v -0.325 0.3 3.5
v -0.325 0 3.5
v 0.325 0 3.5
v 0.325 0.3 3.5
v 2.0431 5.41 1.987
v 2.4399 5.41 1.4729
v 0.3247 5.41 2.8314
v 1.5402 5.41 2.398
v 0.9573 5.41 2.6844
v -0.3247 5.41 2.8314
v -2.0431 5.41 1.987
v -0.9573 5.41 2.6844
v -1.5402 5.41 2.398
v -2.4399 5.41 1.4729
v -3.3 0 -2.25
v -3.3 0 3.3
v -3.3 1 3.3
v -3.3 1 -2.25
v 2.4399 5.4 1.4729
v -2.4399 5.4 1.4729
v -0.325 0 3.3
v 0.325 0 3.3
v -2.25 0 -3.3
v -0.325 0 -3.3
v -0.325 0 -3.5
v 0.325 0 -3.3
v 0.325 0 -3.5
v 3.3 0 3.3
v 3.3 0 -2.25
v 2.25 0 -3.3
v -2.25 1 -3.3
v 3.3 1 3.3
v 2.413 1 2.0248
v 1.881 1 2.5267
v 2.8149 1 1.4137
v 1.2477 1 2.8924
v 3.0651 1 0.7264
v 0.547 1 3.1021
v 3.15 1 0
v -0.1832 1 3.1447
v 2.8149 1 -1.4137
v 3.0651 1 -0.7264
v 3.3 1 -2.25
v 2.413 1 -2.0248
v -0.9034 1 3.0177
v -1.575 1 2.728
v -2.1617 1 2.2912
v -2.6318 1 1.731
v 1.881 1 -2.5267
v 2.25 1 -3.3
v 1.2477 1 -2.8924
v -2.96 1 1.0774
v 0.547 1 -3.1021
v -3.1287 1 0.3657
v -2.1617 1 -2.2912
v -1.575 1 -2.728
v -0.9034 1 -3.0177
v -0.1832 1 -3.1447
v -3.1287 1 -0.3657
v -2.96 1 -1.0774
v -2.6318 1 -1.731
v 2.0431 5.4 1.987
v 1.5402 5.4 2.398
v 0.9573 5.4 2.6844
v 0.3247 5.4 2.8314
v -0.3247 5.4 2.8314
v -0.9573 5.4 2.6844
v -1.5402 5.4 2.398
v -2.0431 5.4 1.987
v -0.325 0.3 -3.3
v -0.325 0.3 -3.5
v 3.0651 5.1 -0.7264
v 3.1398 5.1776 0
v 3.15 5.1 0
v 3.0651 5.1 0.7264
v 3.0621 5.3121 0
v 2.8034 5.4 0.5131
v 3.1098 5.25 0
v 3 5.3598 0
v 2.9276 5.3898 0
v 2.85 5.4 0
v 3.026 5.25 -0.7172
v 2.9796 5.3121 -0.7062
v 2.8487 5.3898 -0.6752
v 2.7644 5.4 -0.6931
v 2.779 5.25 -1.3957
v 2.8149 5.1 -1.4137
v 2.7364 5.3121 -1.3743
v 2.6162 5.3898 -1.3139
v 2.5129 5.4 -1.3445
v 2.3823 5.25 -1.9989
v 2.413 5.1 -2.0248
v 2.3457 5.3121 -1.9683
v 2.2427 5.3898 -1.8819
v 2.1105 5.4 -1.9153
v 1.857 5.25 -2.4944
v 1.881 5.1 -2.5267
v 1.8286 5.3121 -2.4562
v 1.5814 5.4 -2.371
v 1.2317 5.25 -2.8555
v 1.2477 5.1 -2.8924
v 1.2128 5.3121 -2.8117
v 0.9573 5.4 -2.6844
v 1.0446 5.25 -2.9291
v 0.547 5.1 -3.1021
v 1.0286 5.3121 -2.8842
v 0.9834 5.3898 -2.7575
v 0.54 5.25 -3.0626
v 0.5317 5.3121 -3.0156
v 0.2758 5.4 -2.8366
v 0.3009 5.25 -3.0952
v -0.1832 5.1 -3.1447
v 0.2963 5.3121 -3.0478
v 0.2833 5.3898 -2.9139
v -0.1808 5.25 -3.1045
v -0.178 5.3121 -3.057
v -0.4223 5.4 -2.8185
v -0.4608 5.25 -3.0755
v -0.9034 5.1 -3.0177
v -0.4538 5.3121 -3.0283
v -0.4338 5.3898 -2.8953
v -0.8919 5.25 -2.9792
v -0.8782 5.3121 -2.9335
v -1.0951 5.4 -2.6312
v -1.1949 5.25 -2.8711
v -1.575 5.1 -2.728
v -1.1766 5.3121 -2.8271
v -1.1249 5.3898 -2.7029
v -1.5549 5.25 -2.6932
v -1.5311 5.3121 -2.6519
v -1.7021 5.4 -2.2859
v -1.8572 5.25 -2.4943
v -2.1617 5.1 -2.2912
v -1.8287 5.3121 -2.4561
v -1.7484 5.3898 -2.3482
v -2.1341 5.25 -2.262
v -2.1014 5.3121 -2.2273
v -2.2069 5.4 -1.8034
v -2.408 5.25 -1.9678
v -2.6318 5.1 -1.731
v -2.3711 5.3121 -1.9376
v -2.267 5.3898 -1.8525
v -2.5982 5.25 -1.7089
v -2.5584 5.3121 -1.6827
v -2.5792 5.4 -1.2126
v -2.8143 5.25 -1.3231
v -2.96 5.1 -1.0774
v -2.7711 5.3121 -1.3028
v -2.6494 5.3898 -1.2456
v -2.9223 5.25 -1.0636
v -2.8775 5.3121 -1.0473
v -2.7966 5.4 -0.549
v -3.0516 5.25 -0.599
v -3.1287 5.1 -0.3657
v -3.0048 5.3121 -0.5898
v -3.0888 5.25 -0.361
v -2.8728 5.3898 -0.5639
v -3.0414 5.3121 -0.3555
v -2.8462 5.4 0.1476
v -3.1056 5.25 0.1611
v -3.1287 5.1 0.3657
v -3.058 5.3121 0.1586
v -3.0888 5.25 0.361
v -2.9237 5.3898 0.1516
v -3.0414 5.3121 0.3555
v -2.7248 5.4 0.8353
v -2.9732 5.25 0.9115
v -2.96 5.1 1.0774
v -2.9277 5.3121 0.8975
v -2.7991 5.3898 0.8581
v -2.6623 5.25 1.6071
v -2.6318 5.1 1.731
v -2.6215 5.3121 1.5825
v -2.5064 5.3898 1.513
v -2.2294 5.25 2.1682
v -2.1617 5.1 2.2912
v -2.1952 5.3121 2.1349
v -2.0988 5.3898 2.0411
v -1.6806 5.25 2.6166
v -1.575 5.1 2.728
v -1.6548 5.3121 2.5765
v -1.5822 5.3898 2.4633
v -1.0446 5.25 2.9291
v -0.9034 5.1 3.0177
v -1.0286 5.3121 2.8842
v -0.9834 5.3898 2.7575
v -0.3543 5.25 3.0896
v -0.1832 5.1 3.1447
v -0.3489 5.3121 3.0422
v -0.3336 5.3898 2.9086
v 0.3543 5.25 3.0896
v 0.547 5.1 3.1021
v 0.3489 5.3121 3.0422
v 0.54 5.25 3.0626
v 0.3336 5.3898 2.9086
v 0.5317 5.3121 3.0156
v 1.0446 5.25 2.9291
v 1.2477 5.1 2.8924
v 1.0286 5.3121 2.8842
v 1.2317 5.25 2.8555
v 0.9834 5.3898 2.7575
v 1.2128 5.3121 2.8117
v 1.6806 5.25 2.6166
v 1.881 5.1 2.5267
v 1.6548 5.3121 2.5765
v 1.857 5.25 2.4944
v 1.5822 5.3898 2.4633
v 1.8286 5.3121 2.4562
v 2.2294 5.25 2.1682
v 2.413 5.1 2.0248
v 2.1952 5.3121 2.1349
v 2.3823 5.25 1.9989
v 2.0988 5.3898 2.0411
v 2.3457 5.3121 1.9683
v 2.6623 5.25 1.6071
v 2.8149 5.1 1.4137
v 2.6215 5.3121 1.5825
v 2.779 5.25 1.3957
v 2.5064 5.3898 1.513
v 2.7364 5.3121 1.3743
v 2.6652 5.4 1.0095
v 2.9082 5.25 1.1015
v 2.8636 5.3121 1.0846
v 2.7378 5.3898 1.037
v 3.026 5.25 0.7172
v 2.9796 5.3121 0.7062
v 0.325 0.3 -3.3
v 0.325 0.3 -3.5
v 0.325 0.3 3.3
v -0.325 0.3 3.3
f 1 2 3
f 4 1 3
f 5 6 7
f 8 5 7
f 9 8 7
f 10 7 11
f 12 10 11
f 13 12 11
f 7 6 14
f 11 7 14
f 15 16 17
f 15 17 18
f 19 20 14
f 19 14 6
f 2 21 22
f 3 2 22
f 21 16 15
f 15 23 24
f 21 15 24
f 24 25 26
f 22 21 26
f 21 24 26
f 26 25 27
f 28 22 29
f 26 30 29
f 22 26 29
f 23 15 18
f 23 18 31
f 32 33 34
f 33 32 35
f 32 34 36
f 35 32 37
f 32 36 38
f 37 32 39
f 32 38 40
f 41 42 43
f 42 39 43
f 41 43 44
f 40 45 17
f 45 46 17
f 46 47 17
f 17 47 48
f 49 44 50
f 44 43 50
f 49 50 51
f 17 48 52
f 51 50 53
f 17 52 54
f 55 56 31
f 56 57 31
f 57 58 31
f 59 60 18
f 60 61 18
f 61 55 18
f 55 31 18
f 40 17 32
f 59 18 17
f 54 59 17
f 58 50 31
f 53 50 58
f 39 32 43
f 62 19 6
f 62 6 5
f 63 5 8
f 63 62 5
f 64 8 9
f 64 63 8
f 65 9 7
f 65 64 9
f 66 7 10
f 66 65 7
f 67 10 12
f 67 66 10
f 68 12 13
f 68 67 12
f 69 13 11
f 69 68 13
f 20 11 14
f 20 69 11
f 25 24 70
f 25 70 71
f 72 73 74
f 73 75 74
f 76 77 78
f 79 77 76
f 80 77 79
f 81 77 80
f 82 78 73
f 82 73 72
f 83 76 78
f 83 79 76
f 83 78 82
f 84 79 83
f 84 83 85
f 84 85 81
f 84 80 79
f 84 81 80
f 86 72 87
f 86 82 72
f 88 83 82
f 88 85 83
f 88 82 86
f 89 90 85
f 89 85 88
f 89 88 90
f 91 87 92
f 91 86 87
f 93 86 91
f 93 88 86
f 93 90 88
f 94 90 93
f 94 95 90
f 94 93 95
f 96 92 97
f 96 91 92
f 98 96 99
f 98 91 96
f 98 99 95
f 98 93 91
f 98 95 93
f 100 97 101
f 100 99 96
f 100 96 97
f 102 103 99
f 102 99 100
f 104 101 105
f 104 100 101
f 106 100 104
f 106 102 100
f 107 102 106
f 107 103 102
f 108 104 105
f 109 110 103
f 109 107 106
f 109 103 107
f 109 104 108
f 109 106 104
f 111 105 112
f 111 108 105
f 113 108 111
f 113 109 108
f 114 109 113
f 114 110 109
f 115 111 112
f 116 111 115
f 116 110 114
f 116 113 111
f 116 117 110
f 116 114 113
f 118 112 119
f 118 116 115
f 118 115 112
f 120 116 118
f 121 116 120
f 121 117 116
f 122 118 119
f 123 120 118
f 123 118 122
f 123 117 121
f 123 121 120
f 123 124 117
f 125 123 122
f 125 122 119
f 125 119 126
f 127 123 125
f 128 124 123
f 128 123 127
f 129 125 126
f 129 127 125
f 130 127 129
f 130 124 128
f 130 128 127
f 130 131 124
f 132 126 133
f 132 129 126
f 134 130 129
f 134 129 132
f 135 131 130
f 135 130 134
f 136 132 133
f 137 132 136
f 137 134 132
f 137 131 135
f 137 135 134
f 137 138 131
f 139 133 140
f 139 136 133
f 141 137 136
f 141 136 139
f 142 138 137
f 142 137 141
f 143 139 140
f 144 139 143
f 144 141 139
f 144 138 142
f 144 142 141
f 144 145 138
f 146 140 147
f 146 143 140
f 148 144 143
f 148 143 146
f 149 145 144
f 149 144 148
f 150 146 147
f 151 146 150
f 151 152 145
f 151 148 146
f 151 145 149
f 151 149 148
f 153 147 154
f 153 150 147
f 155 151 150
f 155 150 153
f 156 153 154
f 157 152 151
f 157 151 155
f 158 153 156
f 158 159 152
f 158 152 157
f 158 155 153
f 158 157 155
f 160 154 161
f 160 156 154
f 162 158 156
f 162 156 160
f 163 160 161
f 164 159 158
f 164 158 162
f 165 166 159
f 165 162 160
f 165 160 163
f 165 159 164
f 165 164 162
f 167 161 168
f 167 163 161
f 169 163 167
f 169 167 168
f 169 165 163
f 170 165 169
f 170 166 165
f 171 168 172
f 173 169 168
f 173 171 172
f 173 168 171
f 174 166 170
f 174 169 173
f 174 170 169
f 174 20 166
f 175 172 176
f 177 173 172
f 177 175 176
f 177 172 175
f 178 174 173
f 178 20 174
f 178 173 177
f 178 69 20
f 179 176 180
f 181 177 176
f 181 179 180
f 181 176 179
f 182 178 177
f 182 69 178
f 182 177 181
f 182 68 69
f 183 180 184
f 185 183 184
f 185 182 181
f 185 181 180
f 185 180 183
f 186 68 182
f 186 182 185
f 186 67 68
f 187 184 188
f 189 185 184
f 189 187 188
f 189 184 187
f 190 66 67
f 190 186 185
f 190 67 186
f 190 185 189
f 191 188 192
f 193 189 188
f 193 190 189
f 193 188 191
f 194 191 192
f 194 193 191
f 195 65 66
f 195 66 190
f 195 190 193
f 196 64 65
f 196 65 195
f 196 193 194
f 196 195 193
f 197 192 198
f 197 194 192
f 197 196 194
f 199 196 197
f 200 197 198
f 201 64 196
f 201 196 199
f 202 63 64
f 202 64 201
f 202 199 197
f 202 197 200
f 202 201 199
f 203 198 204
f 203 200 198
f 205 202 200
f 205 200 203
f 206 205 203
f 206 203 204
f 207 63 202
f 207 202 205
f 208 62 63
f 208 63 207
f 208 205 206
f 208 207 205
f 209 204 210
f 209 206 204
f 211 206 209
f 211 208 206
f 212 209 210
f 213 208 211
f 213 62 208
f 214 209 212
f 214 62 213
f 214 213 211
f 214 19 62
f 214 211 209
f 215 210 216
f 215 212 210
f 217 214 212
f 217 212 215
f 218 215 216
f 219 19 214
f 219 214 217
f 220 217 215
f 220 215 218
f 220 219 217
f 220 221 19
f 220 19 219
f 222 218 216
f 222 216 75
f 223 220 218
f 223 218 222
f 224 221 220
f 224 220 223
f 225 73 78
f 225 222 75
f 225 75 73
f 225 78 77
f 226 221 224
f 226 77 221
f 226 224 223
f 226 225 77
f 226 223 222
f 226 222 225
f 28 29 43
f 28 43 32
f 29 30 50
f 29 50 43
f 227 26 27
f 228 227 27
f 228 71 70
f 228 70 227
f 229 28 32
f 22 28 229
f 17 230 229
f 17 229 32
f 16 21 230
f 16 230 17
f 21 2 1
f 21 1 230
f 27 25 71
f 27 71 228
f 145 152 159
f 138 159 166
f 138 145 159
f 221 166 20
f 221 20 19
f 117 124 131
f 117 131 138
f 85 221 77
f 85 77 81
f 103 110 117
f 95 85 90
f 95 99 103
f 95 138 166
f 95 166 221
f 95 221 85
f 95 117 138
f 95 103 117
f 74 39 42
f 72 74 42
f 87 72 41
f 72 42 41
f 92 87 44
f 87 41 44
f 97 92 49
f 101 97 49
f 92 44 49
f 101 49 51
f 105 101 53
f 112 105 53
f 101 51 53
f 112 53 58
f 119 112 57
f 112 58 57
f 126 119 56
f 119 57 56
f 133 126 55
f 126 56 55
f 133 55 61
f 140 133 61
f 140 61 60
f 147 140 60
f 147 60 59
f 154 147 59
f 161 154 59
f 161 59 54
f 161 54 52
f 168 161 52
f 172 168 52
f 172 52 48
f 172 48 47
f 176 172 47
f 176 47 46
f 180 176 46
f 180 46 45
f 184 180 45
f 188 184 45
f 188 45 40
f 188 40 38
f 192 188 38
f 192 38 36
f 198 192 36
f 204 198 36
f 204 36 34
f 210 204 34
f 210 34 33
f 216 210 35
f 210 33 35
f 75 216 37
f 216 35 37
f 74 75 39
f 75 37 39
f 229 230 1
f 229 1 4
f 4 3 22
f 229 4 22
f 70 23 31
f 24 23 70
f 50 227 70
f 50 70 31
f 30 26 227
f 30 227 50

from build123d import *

# Parameters (mm, degrees)
BOSS_EXTRUDE1_DEPTH = 1
SKETCH3_R           = 3.15
BOSS_EXTRUDE2_DEPTH = 5.4
FILLET1_R           = 0.3
SKETCH4_W           = 0.65
SKETCH4_H           = 2.6
BOSS_EXTRUDE3_DEPTH = 0.3
BOSS_EXTRUDE4_DEPTH = 0.01


with BuildPart() as part:
    # Sketch2 → Boss-Extrude1 (new body)
    with BuildSketch(Plane(origin=(0, 0, 0), x_dir=(1, 0, 0), z_dir=(0, 1, 0))):
        Polygon((3.3, -3.3), (-3.3, -3.3), (-3.3, 2.25), (-2.25, 3.3), (2.25, 3.3), (3.3, 2.25), align=None)
    extrude(amount=BOSS_EXTRUDE1_DEPTH)

    # Sketch3 → Boss-Extrude2 (add)
    with BuildSketch(Plane(origin=(0, 0, 0), x_dir=(1, 0, 0), z_dir=(0, 1, 0))):
        Circle(SKETCH3_R)
    extrude(amount=BOSS_EXTRUDE2_DEPTH)

    # Fillet1
    fillet1_edges = [part.edges().sort_by_distance(p)[0] for p in [
        (-3.15, 5.4, 0),
    ]]
    fillet(fillet1_edges, radius=FILLET1_R)

    # Sketch4 → Boss-Extrude3 (add)
    with BuildSketch(Plane(origin=(0, 0, 0), x_dir=(1, 0, 0), z_dir=(0, 1, 0))):
        with Locations((0, 2.2)):
            Rectangle(SKETCH4_W, SKETCH4_H)
        with Locations((0, -2.2)):
            Rectangle(SKETCH4_W, SKETCH4_H)
    extrude(amount=BOSS_EXTRUDE3_DEPTH)

    # Sketch5 → Boss-Extrude4 (add)
    with BuildSketch(Plane(origin=(0, 5.4, 0), x_dir=(1, 0, 0), z_dir=(0, 1, 0))):
        with BuildLine():
            Line((-2.439908144, -1.472870752), (2.439908144, -1.472870752))
            ThreePointArc((2.439908144, -1.472870752), (0, -2.85), (-2.439908144, -1.472870752))
        make_face()
    extrude(amount=BOSS_EXTRUDE4_DEPTH)


solid = part.part
